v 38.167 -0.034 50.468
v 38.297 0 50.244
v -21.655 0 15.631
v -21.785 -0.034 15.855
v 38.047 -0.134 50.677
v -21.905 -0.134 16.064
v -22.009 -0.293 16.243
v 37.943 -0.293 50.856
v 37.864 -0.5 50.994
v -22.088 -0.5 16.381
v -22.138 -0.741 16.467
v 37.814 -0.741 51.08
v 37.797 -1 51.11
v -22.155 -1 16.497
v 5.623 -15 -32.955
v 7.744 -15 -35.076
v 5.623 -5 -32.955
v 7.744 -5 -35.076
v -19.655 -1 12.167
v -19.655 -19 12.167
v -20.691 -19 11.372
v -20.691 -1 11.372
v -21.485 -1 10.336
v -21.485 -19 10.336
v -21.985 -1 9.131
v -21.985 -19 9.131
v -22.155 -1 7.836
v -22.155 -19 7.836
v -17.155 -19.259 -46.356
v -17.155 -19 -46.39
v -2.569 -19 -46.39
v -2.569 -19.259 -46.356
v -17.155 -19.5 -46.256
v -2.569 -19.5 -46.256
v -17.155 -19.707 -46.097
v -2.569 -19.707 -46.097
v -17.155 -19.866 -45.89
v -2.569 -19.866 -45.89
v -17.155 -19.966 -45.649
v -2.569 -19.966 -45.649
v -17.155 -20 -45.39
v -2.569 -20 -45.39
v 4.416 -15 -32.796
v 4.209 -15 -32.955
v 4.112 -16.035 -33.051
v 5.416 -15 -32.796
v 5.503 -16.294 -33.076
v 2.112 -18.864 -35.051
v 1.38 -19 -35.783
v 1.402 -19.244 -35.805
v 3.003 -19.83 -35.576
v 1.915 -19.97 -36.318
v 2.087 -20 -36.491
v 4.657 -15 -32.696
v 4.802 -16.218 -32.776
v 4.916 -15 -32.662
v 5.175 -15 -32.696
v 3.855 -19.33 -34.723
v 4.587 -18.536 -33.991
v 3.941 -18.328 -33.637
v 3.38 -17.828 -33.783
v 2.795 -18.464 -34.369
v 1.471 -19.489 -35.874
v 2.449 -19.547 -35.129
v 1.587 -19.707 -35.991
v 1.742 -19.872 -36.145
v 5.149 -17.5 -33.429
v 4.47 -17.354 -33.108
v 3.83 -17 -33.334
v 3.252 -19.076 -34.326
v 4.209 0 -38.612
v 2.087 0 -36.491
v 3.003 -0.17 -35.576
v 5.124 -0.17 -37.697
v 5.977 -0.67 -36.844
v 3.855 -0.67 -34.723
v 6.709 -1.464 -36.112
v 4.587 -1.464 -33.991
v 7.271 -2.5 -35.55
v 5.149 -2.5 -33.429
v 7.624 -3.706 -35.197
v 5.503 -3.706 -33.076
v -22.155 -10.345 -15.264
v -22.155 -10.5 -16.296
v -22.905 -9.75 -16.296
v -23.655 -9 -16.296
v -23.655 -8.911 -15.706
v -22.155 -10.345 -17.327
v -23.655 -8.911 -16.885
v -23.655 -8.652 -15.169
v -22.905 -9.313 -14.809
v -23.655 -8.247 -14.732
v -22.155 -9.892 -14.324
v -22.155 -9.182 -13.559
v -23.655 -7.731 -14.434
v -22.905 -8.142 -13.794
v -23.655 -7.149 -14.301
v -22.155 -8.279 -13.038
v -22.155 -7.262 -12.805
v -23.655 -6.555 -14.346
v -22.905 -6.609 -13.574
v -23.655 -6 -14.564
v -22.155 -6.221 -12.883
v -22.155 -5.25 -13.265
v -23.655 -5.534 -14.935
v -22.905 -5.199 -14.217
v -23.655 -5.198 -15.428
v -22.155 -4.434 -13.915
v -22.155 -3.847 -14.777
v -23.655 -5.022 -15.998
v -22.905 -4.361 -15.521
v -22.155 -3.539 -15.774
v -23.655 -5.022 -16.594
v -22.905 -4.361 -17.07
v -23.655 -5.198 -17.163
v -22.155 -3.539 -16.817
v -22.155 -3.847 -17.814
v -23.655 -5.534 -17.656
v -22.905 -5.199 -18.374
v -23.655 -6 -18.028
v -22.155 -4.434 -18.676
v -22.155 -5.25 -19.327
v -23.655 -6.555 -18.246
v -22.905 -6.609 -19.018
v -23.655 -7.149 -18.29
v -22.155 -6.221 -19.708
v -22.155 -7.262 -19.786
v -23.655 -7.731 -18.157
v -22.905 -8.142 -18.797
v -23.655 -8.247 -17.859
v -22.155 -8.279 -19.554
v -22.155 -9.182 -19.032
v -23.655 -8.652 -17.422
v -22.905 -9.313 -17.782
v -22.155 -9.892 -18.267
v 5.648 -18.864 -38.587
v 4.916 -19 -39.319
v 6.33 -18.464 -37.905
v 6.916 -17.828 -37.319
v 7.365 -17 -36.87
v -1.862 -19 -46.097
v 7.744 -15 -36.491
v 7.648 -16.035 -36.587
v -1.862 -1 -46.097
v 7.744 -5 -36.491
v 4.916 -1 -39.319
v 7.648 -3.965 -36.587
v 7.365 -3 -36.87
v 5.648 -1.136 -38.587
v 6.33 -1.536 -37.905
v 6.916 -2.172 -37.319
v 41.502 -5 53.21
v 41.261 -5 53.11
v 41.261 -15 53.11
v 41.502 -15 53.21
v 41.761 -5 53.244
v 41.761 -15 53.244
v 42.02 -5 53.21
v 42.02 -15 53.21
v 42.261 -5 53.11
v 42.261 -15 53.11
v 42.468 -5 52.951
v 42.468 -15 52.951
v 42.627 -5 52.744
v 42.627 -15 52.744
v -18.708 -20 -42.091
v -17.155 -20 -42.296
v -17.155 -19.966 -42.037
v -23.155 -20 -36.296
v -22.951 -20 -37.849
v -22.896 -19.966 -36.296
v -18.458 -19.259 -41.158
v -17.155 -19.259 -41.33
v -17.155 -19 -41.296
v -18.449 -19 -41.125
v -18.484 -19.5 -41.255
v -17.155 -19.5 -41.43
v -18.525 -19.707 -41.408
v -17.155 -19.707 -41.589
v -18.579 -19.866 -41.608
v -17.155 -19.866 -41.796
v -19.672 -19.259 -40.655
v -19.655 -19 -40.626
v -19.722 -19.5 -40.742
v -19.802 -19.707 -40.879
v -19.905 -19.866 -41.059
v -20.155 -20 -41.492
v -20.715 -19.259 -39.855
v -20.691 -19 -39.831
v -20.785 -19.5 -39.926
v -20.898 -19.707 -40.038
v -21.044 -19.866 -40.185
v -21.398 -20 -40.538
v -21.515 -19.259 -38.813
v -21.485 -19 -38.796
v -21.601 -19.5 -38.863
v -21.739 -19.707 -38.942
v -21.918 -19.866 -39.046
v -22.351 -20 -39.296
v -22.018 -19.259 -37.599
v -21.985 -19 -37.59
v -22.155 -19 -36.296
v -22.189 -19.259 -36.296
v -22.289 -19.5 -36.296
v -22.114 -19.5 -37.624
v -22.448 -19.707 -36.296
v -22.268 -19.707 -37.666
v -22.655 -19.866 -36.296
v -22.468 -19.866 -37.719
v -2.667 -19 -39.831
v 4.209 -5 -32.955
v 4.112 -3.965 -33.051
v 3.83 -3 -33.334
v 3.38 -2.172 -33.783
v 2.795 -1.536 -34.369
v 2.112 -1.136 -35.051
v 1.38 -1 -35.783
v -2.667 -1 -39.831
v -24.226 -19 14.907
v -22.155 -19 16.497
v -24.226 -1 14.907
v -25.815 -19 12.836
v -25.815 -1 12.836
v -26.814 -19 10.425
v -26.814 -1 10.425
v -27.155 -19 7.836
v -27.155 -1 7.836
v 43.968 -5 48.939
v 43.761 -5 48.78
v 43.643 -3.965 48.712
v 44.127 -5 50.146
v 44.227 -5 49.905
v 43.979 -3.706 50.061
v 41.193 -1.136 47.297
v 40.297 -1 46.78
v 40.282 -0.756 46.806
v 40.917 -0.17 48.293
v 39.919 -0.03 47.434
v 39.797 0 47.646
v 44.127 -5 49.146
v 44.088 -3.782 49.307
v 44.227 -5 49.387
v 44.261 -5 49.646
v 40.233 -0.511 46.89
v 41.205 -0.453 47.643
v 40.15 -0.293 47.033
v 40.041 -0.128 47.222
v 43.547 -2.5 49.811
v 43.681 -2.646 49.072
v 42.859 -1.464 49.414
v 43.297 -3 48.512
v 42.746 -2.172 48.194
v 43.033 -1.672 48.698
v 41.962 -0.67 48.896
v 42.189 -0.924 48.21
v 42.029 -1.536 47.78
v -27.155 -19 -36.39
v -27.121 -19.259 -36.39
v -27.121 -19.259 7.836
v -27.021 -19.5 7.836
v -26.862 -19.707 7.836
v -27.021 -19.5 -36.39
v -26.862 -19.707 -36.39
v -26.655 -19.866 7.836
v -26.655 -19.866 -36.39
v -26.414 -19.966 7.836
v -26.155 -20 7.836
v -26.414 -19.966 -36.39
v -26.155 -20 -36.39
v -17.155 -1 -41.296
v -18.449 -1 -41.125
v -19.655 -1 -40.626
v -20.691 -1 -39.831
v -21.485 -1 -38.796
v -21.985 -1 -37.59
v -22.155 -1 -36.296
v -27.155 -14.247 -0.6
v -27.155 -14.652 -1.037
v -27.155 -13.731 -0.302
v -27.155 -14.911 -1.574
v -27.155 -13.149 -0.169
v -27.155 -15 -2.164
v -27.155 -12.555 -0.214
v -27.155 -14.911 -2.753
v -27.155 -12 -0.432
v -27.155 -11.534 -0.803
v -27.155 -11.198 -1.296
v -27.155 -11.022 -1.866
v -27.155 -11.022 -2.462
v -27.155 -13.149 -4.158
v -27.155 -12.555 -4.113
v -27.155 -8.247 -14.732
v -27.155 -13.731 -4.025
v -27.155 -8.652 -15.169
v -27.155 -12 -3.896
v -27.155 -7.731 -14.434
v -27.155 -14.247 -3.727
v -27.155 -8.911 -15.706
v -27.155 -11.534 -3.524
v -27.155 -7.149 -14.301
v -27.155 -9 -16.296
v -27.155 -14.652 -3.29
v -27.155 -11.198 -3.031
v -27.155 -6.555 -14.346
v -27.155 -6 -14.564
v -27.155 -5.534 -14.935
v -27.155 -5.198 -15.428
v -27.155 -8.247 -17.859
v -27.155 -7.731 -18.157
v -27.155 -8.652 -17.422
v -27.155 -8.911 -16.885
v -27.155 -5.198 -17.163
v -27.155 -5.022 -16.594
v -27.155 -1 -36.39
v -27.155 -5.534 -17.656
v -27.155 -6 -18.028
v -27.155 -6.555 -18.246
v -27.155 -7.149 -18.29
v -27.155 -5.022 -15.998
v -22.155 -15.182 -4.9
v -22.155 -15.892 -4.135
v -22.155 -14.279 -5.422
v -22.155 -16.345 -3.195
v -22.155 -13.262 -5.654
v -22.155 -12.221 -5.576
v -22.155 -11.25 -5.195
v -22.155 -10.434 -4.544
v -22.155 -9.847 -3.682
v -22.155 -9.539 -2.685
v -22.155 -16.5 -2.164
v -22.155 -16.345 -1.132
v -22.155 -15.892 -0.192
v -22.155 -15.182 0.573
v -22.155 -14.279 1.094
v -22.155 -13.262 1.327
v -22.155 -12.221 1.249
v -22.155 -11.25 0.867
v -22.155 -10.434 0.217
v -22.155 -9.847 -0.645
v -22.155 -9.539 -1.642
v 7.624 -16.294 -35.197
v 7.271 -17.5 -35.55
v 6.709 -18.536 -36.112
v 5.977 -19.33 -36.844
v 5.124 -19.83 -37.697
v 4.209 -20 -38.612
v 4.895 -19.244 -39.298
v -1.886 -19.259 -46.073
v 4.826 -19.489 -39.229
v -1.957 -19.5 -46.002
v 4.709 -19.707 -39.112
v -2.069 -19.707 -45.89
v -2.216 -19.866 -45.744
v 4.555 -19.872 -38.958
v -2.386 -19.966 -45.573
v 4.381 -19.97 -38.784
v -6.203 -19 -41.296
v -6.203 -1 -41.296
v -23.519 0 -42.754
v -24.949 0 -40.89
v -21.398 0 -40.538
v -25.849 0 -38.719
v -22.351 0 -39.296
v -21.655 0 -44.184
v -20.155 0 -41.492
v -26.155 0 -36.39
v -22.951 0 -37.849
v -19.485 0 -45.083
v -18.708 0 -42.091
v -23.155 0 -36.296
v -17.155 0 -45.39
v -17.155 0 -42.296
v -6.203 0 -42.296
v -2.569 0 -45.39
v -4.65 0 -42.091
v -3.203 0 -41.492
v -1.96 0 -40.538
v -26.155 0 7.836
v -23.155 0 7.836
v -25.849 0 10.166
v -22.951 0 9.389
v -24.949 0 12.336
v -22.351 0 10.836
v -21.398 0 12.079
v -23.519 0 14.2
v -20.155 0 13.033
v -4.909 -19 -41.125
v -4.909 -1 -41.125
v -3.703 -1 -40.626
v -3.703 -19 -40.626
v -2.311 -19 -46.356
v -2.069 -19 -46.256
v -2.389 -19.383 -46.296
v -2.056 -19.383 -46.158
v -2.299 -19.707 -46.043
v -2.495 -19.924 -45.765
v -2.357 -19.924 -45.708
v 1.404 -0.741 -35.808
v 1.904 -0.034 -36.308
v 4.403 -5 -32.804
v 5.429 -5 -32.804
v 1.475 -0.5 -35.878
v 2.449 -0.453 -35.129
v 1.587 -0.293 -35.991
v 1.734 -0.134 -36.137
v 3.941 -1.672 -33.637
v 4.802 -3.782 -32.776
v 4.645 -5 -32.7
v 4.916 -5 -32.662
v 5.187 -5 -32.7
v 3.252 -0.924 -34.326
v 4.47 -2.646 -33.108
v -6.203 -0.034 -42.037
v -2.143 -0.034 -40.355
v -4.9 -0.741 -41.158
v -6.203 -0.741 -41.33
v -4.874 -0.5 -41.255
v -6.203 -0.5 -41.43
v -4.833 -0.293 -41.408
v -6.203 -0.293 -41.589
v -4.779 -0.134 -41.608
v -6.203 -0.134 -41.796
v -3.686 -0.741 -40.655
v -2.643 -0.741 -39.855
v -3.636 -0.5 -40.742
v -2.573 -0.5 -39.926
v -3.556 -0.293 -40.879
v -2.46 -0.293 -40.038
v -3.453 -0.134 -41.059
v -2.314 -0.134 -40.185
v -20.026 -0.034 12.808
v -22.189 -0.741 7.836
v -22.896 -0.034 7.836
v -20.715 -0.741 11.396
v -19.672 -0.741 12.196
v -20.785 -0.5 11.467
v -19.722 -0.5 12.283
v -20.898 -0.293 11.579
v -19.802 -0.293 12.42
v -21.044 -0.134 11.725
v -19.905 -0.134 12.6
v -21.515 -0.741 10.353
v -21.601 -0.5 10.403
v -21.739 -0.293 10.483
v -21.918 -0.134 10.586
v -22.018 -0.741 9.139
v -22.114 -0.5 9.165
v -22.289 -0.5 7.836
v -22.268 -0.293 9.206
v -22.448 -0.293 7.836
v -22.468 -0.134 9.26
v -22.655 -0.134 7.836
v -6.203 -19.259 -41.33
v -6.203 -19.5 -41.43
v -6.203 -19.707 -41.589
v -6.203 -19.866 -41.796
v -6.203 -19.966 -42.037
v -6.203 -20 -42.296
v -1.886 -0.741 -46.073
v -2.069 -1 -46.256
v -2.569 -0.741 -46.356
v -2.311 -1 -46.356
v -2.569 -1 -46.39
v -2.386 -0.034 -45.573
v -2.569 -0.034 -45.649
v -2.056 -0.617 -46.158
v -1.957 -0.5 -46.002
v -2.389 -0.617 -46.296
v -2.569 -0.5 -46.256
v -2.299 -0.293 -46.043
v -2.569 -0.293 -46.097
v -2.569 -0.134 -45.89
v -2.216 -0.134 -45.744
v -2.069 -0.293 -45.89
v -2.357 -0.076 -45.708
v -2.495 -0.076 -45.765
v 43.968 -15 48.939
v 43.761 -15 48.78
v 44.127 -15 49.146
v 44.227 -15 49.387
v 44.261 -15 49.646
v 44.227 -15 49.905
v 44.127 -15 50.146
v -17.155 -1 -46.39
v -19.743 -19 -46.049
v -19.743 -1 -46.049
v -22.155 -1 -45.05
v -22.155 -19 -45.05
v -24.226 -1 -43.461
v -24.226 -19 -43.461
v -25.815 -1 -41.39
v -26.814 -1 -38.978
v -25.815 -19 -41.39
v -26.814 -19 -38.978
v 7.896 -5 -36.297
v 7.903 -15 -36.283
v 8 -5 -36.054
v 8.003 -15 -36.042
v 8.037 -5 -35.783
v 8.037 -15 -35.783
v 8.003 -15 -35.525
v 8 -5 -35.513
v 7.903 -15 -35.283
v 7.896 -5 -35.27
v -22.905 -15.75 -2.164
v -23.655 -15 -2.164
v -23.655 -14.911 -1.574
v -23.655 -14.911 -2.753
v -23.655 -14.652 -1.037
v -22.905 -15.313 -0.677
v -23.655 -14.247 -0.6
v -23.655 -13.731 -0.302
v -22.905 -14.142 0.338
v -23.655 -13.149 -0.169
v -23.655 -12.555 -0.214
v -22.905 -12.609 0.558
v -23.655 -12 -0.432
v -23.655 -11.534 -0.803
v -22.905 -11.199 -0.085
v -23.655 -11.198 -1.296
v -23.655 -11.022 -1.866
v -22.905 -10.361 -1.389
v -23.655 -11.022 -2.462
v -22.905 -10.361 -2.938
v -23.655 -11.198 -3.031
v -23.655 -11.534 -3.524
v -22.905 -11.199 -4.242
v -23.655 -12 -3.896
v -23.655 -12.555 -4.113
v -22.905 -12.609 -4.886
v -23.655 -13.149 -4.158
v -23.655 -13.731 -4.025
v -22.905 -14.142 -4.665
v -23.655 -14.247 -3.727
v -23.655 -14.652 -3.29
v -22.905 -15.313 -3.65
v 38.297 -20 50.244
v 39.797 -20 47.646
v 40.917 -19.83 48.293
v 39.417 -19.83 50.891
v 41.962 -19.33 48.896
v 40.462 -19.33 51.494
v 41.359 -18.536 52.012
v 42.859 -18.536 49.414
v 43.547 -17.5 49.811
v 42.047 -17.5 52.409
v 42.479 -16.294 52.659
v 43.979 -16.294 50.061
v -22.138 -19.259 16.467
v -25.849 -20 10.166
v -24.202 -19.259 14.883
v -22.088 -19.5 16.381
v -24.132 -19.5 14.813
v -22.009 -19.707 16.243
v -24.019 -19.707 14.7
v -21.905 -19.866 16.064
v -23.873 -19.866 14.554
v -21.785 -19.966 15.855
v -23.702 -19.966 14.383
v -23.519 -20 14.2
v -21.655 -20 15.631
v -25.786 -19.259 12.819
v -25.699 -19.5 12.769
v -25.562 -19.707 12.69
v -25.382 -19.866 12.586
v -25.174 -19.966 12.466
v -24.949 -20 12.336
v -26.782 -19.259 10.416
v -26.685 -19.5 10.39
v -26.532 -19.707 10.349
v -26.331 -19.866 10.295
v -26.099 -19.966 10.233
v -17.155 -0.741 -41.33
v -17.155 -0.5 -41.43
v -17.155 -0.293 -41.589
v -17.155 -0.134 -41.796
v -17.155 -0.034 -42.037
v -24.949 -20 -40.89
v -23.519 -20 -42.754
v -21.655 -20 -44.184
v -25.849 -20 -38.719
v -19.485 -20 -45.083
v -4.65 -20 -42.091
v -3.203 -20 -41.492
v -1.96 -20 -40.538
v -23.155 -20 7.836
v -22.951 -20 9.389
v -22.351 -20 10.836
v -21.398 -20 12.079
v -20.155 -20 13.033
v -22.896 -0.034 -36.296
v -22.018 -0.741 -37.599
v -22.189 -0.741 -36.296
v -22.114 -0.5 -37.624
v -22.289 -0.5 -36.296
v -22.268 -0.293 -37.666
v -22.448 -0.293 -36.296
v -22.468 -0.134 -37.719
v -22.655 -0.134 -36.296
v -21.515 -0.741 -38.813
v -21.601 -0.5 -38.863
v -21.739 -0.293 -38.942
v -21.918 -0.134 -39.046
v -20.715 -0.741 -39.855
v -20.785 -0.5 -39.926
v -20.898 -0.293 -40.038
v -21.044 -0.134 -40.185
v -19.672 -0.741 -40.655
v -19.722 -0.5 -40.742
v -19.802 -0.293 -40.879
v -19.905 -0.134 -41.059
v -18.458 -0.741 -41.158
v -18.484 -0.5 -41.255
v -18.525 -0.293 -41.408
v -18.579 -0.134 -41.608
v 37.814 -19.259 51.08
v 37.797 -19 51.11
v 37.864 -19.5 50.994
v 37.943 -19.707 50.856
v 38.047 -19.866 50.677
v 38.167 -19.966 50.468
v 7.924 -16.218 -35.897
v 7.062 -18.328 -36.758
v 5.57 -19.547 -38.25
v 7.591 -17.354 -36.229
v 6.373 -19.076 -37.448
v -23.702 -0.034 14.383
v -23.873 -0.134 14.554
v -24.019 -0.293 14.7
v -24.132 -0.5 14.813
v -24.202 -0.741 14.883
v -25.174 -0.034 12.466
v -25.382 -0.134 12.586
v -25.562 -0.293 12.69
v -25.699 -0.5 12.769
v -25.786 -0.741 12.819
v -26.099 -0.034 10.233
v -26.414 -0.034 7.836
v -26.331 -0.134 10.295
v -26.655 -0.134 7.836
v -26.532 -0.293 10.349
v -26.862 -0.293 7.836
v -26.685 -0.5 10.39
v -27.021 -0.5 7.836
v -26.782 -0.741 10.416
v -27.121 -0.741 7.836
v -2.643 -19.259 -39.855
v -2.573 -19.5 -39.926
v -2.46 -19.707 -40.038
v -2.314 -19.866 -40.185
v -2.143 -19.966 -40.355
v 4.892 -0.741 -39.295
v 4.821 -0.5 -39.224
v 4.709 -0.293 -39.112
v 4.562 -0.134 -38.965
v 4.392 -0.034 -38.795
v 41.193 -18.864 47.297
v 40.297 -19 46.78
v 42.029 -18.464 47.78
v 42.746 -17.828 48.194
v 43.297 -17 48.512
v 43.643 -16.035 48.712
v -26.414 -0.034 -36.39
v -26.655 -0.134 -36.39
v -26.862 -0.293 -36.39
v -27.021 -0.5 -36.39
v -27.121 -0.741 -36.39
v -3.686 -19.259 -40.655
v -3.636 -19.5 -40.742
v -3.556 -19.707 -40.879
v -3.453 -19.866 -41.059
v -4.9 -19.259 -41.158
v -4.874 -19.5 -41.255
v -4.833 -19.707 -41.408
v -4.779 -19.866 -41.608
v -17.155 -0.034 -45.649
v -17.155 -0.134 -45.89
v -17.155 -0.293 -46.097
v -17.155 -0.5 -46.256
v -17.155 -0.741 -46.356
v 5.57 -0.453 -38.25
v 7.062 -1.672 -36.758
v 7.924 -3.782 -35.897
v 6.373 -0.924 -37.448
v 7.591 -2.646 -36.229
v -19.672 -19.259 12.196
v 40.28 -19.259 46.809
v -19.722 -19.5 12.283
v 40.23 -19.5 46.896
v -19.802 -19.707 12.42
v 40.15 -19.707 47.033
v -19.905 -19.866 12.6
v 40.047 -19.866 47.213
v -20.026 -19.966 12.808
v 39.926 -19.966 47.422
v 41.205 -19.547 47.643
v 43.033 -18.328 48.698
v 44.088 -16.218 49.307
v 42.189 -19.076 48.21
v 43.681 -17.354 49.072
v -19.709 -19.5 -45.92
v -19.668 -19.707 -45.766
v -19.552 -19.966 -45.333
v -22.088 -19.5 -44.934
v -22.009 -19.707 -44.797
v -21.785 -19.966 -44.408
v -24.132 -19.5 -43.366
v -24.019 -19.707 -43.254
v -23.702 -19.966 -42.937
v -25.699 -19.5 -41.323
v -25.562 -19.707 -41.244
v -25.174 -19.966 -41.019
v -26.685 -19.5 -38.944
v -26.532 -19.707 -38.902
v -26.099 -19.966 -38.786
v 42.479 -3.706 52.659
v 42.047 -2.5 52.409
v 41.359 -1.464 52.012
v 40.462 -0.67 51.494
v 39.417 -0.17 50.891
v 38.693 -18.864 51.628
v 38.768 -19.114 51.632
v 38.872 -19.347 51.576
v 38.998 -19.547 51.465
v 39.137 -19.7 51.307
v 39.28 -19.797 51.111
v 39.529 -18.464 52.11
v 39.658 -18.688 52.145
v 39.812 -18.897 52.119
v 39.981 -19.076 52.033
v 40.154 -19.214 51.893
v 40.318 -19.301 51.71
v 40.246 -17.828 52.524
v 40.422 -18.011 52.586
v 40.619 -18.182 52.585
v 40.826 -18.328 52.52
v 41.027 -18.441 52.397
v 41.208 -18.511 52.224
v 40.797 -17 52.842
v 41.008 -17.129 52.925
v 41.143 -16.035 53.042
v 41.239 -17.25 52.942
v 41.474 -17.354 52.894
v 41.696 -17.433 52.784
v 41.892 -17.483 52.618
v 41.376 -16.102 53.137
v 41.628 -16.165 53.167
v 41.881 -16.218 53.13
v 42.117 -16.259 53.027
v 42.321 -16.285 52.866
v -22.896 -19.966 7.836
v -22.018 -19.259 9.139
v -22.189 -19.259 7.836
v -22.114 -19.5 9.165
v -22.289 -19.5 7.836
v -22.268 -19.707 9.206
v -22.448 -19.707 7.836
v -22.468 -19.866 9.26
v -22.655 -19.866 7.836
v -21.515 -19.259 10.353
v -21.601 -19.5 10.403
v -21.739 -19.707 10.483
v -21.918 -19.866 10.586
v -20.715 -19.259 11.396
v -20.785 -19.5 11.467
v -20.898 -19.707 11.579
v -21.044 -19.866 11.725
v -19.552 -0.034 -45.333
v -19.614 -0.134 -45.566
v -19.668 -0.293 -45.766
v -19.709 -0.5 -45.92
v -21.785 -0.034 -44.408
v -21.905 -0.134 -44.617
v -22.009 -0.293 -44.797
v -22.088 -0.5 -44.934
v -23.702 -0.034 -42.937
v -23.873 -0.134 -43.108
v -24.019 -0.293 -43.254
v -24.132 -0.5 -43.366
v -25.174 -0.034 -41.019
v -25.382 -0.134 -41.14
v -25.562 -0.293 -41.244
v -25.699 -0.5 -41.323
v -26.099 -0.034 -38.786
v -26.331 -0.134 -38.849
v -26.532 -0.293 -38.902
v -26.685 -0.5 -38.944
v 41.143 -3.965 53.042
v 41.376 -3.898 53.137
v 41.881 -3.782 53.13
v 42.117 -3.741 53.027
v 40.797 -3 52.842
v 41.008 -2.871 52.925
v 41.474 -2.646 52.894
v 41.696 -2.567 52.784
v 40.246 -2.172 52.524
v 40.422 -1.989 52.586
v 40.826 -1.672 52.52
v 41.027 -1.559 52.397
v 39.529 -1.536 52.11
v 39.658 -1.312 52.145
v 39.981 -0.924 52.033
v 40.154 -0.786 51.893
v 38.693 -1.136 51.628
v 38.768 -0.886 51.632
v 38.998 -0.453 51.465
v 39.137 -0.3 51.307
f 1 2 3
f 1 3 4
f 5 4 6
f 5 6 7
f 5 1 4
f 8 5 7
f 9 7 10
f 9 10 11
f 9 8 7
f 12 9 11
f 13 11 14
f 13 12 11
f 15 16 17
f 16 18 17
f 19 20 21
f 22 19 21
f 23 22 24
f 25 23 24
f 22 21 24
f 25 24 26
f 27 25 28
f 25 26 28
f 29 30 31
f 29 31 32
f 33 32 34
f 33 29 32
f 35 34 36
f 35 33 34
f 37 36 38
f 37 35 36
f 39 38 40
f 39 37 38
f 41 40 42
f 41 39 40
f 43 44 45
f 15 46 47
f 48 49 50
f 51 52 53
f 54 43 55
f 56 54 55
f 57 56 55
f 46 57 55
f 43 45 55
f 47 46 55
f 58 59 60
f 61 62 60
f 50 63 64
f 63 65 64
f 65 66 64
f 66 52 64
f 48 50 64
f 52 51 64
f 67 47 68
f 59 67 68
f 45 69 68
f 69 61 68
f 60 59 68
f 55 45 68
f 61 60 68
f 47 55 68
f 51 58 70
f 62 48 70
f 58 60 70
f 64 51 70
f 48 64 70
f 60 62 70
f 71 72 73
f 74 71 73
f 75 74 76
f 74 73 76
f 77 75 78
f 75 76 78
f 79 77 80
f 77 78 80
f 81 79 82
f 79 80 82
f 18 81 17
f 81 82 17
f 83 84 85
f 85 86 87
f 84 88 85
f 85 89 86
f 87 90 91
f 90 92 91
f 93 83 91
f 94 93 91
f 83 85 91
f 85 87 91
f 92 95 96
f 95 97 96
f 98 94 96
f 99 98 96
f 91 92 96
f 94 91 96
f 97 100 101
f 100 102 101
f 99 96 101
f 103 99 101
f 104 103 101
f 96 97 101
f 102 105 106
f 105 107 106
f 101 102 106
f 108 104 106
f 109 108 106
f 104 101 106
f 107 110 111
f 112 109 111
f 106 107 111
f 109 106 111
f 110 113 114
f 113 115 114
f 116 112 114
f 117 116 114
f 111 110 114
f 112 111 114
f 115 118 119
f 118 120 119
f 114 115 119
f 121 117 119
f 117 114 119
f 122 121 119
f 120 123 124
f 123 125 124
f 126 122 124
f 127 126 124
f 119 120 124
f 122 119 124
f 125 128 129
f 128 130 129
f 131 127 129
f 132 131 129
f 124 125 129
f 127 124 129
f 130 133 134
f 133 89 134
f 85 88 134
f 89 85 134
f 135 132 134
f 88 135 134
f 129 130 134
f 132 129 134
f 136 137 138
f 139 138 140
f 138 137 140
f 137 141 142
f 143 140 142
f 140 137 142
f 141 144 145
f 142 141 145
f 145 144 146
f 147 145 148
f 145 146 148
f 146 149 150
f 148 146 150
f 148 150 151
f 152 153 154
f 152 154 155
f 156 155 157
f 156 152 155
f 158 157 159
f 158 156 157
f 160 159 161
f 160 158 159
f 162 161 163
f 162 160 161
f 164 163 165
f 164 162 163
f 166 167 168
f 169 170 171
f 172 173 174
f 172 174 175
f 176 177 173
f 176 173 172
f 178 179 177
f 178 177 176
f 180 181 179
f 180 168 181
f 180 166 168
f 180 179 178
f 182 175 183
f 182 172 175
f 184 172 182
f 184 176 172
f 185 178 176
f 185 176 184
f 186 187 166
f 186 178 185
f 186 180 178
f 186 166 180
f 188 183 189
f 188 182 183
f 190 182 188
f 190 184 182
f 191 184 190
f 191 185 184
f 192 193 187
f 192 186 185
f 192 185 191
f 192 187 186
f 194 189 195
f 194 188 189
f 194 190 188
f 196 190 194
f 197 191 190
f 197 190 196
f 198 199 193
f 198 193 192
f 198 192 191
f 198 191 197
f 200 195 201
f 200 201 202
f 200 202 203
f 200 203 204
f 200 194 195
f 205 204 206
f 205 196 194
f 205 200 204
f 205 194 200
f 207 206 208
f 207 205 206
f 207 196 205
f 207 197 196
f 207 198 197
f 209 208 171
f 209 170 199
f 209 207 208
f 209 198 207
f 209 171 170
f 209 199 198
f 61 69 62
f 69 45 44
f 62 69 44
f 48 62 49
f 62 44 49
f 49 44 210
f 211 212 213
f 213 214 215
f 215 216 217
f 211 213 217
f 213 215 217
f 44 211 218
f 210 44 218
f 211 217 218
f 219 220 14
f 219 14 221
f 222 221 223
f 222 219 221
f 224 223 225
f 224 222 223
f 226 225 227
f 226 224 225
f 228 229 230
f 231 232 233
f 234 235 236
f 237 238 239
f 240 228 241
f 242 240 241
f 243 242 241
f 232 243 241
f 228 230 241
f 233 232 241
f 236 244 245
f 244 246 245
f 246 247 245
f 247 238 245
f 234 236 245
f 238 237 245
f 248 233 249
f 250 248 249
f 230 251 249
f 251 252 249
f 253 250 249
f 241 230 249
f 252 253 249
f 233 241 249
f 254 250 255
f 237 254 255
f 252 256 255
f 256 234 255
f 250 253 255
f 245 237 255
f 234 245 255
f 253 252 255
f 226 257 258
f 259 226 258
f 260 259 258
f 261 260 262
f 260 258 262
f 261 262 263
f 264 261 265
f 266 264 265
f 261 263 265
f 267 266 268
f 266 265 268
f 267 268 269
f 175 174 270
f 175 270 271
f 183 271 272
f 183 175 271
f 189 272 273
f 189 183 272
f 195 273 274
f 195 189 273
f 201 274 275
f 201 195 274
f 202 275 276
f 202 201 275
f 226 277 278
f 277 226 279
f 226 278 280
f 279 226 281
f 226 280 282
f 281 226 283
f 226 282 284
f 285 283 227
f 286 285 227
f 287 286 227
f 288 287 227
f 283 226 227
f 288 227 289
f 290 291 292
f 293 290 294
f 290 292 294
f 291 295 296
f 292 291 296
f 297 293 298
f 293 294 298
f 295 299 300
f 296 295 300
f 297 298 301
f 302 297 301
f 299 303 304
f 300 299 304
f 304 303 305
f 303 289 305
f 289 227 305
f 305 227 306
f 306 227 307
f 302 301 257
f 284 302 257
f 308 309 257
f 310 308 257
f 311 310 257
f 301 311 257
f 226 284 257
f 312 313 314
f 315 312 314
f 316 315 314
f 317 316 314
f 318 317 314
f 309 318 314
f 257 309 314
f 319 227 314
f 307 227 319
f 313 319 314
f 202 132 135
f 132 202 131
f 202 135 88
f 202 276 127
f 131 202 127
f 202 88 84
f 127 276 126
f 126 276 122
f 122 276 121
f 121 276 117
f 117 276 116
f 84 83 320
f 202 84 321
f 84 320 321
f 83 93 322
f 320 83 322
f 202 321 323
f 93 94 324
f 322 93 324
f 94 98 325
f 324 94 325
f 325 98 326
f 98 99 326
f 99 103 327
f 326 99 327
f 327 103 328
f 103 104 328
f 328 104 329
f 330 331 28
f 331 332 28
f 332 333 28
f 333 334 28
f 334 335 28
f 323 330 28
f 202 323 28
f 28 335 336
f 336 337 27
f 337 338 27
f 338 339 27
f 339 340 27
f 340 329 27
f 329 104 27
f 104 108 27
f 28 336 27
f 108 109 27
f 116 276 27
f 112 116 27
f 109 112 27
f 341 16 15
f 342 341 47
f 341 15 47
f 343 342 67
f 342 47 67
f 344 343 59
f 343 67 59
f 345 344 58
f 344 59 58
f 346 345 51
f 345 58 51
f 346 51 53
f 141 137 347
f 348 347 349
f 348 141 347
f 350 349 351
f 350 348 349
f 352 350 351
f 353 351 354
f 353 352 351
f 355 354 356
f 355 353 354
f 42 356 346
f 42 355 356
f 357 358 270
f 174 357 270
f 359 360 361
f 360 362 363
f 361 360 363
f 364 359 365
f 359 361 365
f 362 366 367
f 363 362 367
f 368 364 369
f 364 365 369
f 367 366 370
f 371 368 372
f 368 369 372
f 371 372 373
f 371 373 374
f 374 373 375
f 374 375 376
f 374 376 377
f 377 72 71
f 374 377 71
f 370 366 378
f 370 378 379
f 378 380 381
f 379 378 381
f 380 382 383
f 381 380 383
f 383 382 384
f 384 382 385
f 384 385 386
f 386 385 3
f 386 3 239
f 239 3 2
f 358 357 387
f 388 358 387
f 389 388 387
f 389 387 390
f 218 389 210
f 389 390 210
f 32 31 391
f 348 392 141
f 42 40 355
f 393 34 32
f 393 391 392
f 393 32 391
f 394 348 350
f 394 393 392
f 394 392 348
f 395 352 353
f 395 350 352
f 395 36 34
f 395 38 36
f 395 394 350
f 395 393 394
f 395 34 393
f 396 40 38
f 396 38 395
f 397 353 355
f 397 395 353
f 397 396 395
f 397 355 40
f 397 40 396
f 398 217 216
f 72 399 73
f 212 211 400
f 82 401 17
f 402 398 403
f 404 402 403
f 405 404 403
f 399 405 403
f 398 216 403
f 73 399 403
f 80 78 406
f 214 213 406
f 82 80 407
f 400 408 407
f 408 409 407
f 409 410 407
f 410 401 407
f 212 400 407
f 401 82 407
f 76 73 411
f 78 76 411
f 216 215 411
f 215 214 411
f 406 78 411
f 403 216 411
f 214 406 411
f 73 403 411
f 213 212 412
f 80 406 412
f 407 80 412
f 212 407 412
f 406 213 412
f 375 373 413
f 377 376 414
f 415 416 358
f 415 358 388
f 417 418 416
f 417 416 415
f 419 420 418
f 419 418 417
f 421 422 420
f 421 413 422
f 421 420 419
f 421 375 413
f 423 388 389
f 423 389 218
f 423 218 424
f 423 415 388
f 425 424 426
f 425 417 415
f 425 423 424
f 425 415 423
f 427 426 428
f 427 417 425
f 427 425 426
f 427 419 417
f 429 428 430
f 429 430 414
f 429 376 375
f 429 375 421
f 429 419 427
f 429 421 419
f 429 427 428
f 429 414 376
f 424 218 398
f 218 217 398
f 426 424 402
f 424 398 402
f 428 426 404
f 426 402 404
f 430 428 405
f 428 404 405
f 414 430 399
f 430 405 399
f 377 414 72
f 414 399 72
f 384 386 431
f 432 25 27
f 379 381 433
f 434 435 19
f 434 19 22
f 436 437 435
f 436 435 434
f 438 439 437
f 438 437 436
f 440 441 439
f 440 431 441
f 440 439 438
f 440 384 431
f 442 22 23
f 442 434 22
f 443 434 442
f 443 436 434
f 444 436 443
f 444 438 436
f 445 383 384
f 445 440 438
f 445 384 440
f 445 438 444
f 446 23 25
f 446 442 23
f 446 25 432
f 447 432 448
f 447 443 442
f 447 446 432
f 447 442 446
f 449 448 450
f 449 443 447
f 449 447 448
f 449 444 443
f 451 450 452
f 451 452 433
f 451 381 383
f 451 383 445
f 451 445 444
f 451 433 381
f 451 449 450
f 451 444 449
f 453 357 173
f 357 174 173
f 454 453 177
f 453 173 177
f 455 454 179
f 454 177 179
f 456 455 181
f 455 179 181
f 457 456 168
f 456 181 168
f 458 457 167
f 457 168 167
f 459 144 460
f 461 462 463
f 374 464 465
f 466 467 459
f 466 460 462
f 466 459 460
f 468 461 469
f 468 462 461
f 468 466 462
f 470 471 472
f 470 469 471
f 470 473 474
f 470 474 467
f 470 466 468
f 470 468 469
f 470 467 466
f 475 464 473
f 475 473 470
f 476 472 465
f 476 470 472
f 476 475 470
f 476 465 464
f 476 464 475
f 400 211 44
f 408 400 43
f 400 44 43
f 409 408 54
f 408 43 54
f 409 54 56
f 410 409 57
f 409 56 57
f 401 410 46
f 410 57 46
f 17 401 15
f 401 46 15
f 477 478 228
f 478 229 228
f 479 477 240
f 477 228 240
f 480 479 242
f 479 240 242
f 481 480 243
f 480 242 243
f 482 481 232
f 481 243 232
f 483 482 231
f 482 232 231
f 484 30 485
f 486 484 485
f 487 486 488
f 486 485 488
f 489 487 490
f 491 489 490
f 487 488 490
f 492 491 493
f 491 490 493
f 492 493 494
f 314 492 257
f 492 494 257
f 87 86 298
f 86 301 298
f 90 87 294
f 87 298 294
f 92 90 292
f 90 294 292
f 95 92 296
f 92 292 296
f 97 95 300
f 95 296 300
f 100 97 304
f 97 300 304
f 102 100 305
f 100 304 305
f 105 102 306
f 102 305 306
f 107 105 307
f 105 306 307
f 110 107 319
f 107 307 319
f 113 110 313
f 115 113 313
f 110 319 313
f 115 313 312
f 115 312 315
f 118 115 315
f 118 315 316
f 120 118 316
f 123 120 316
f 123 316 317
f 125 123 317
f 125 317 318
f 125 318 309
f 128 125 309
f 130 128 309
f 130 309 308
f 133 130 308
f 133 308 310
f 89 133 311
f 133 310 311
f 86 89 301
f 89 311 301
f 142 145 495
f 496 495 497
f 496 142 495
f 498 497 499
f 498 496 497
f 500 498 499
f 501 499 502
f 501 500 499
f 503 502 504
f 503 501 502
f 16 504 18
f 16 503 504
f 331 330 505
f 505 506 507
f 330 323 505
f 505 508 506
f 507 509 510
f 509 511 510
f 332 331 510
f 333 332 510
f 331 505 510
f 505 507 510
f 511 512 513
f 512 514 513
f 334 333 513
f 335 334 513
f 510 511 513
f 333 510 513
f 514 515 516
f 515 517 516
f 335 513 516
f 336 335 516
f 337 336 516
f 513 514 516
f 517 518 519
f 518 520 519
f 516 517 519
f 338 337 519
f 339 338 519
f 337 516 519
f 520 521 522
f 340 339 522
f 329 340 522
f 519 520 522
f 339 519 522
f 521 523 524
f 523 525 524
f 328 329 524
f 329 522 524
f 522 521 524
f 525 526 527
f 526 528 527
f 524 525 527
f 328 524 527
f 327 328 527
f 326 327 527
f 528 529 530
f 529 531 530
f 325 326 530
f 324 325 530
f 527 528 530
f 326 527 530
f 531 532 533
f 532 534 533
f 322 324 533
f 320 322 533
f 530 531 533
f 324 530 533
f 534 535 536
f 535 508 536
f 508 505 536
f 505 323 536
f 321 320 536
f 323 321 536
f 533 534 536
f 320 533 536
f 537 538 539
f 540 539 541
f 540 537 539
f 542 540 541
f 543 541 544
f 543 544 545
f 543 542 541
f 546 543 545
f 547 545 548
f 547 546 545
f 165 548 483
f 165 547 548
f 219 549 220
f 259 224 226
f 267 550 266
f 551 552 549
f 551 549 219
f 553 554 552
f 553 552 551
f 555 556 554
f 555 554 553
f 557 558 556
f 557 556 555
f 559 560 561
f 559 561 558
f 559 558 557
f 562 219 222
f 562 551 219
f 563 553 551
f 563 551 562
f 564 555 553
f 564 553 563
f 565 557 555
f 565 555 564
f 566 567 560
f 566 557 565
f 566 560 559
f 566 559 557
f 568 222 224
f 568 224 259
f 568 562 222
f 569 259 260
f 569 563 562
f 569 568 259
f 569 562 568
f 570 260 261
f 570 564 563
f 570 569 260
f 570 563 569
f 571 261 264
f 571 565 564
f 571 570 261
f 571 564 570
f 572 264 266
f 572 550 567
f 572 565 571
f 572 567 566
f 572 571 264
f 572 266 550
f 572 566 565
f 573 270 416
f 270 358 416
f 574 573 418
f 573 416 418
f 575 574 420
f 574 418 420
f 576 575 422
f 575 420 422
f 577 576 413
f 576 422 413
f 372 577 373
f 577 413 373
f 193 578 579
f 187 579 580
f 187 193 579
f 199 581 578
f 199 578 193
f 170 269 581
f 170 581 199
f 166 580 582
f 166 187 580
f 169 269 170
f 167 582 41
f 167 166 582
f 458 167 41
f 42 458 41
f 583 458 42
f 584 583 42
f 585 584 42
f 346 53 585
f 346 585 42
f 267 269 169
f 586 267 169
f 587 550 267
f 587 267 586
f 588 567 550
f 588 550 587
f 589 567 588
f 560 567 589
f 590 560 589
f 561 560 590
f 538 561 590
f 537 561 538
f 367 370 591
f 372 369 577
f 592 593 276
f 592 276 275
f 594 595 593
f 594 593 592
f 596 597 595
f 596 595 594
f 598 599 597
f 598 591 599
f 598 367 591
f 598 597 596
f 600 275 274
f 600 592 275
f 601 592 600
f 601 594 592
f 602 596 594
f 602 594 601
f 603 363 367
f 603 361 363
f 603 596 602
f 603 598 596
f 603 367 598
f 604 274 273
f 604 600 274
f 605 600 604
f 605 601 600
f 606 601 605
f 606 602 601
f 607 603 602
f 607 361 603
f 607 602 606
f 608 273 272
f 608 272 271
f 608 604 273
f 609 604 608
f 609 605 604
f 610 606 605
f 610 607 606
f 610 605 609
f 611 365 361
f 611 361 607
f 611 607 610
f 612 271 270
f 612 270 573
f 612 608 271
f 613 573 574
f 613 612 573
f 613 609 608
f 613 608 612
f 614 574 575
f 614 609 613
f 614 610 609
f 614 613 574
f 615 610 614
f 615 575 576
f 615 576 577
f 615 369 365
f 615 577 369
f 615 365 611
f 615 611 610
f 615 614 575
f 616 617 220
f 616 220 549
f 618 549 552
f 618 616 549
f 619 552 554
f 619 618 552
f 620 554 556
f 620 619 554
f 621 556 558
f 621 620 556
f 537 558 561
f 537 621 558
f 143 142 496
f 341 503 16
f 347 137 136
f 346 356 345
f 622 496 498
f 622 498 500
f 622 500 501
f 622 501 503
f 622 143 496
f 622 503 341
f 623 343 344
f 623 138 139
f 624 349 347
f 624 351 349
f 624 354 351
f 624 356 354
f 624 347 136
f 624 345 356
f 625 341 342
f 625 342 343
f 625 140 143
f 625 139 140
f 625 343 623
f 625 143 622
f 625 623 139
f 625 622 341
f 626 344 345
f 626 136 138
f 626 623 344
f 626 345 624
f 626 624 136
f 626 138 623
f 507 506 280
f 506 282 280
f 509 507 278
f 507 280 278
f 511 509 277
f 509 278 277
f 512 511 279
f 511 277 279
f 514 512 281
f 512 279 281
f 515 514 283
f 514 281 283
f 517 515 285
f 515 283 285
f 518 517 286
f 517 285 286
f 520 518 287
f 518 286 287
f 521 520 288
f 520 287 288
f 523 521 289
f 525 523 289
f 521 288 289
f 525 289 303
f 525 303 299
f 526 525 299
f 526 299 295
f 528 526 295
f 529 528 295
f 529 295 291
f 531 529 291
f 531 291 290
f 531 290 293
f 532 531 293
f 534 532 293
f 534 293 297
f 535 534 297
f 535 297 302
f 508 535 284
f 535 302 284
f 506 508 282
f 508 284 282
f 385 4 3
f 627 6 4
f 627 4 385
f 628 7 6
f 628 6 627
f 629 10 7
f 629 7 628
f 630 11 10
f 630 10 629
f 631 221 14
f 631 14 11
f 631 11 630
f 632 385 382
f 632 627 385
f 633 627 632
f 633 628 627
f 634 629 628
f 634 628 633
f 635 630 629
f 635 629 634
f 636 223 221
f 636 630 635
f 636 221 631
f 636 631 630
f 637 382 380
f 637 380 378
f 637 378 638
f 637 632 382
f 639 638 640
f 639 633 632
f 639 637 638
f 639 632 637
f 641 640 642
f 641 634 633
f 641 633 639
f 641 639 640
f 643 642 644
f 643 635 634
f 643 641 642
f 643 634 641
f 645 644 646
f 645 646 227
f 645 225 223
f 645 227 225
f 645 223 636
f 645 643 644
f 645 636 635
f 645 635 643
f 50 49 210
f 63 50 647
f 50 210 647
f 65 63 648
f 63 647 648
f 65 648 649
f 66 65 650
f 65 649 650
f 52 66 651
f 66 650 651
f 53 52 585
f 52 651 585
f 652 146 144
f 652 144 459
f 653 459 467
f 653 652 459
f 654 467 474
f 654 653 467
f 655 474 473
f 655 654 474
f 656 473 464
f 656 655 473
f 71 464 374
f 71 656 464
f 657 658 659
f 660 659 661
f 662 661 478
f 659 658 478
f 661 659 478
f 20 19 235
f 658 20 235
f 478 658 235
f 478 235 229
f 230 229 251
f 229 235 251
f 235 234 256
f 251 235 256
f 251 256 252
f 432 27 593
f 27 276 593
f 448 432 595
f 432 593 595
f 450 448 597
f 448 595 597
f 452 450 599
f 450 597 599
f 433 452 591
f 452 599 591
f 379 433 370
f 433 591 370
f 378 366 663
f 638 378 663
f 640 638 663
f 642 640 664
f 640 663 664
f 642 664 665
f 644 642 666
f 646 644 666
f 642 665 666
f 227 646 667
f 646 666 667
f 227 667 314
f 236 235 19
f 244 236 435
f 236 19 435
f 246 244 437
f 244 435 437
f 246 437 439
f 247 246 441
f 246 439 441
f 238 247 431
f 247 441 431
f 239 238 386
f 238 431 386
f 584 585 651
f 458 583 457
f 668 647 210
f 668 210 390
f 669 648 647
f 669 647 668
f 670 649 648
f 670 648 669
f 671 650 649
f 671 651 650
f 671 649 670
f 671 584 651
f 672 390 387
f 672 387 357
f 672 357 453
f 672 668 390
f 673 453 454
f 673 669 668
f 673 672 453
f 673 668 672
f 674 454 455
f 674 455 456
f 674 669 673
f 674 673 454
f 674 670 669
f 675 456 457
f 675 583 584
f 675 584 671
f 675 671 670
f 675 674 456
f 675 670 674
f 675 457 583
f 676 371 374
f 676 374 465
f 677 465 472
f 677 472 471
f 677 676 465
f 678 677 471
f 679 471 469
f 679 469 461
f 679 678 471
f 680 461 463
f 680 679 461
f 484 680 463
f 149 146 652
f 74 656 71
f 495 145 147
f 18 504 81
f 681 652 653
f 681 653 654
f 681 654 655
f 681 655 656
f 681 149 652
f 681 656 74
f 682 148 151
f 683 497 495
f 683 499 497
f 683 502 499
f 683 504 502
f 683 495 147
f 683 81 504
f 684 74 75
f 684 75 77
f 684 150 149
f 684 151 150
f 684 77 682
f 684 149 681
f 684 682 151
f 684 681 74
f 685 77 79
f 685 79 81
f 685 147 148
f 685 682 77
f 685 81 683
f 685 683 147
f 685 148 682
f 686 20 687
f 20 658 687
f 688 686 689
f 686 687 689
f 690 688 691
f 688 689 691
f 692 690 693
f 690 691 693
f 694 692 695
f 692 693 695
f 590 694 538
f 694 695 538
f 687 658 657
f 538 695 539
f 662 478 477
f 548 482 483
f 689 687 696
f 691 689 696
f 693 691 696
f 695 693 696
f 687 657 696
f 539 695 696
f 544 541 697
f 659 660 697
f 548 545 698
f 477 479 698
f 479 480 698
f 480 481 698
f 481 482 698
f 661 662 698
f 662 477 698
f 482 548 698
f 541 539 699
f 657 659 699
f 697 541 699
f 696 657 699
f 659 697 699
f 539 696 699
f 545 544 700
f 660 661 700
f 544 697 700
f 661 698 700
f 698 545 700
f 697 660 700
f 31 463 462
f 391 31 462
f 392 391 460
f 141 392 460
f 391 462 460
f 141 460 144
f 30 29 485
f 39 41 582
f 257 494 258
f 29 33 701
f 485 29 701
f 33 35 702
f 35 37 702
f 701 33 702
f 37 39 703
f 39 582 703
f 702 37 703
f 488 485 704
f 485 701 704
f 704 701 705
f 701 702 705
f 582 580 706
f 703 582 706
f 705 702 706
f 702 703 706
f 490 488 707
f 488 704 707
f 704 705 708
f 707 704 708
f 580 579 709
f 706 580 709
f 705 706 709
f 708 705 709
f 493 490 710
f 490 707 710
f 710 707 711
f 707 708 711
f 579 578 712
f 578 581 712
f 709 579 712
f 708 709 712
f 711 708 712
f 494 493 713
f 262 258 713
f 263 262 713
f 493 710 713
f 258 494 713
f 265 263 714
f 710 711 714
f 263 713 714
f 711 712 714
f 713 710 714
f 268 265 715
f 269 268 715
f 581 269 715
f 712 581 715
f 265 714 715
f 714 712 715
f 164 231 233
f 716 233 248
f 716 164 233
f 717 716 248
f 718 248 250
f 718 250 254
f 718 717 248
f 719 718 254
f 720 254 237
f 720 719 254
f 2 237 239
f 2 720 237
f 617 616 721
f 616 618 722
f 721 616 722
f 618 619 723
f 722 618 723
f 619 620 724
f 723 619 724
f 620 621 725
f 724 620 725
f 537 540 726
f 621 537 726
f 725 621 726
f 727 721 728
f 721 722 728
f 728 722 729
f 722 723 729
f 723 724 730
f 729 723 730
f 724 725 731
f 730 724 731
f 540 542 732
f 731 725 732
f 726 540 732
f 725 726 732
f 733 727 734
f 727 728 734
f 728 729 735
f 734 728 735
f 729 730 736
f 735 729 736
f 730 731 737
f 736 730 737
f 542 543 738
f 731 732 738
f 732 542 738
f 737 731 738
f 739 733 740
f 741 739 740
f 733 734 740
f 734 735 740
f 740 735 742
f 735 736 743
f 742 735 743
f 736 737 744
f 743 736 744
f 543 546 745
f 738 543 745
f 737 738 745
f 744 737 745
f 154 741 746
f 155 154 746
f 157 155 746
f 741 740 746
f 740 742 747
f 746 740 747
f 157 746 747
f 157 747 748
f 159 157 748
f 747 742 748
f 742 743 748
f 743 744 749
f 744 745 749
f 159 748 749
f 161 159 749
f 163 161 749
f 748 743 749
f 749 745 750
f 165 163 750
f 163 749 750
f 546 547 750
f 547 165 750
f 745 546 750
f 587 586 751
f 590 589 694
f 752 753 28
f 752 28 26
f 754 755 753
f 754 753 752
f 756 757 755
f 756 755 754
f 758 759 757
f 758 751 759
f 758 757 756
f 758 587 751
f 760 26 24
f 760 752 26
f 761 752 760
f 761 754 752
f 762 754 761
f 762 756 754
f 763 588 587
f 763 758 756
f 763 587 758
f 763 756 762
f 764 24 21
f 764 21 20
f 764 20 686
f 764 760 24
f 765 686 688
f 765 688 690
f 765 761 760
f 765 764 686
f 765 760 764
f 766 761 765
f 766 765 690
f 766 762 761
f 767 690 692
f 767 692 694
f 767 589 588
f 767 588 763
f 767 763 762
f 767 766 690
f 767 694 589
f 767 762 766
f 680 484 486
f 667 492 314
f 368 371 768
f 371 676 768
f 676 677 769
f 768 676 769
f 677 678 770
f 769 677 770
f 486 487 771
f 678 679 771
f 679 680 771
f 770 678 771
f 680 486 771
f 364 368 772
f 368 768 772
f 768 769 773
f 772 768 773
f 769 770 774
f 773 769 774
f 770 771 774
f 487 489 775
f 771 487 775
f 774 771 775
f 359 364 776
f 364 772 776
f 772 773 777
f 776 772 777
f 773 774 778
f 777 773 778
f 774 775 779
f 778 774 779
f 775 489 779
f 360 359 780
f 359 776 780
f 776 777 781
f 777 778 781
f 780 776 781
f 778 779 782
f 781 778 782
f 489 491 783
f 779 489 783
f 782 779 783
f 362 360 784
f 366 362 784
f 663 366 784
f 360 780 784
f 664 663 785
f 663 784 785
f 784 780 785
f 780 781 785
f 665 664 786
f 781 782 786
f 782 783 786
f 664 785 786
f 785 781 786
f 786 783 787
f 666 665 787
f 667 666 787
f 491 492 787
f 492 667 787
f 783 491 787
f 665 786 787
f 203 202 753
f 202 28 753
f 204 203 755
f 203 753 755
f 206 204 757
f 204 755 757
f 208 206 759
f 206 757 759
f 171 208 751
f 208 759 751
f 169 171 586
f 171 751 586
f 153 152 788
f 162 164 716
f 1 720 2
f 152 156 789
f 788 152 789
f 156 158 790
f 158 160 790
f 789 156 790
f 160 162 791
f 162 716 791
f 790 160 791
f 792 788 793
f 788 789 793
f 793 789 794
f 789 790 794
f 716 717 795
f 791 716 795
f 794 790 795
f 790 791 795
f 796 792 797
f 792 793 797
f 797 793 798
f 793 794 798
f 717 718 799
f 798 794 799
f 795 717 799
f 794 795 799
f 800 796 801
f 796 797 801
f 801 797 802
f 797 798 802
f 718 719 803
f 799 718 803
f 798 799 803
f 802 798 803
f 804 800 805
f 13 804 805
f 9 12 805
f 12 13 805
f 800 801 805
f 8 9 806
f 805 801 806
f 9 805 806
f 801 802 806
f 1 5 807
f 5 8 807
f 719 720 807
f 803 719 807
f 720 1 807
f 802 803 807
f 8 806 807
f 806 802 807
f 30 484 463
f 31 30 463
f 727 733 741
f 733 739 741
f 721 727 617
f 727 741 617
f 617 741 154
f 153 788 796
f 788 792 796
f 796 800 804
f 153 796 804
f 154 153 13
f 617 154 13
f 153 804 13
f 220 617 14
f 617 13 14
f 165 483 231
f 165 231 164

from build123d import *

# Parameters (mm, degrees)
F1_DEPTH        = 20
F2_R            = 5
F3_R            = 5
F4_R            = 10
F5_R            = 5
F6_R            = 5
F7_R            = 5
F8_R            = 5
F9_R            = 5
F10_R           = 1
F11_R           = 1
F12_T1_DEPTH    = 14.5857864376
F12_T3_DEPTH    = 44.2264973081
F12_T5_DEPTH    = 69.2264973081
F12_T7_DEPTH    = 18
F12_T9_DEPTH    = 10
F12_T14_DEPTH   = 1
F12_T20_DEPTH   = 1
F12_T24_ANGLE   = 90
F12_T26_ANGLE   = 90
F12_T28_ANGLE   = 60
F12_T30_ANGLE   = 60
F12_T32_ANGLE   = 90
F12_T34_ANGLE   = 90
F14_D           = 4
F14_CSINK_D     = 7
F14_CSINK_ANGLE = 90
F15_D           = 4
F15_CSINK_D     = 7
F15_CSINK_ANGLE = 90


# Not quite as in the source:
# - a fillet or chamfer that OpenCascade refuses, or shapes differently, is made with other operations: its cross-section is extruded or revolved along the edge and cut away or added


with BuildPart() as f1:
    # F0 (on Front) → F1 (new body)
    with BuildSketch(Plane.XZ):
        Polygon((42.1268583603, 53.609912917), (-27.1551739424, 13.609912917), (-27.1551739424, -46.390087083), (-2.1551739424, -46.390087083), (8.4514277754, -35.7834853652), (4.9158938694, -32.2479514593), (-4.1318040205, -41.2956493492), (-22.1551739424, -41.2956493492), (-22.1551739424, 10.7231615711), (44.6268583603, 49.2797858981), align=None)
    extrude(amount=F1_DEPTH)

    # F2
    f2_edges = [f1.edges().sort_by_distance(p)[0] for p in [
        (-22.155174, -10, -41.295649),
    ]]
    fillet(f2_edges, radius=F2_R)

    # F3
    f3_edges = [f1.edges().sort_by_distance(p)[0] for p in [
        (-4.131804, -10, -41.295649),
    ]]
    fillet(f3_edges, radius=F3_R)

    # F4
    f4_edges = [f1.edges().sort_by_distance(p)[0] for p in [
        (-27.155174, -10, -46.390087),
        (-27.155174, -10, 13.609913),
    ]]
    fillet(f4_edges, radius=F4_R)

    # F5
    f5_edges = [f1.edges().sort_by_distance(p)[0] for p in [
        (-22.155174, -10, 10.723162),
    ]]
    fillet(f5_edges, radius=F5_R)

    # F6
    f6_edges = [f1.edges().sort_by_distance(p)[0] for p in [
        (6.683661, 0, -34.015718),
    ]]
    fillet(f6_edges, radius=F6_R)

    # F7
    f7_edges = [f1.edges().sort_by_distance(p)[0] for p in [
        (6.683661, -20, -34.015718),
    ]]
    fillet(f7_edges, radius=F7_R)

    # F8
    f8_edges = [f1.edges().sort_by_distance(p)[0] for p in [
        (43.376858, -20, 51.444849),
    ]]
    fillet(f8_edges, radius=F8_R)

    # F9
    f9_edges = [f1.edges().sort_by_distance(p)[0] for p in [
        (43.376858, 0, 51.444849),
    ]]
    fillet(f9_edges, radius=F9_R)

    # F10
    f10_edges = [f1.edges().sort_by_distance(p)[0] for p in [
        (43.358594, -18.535534, 48.547553),
    ]]
    fillet(f10_edges, radius=F10_R)

    # F11
    f11_edges = [f1.edges().sort_by_distance(p)[0] for p in [
        (7.415894, -18.535534, -36.819019),
    ]]
    fillet(f11_edges, radius=F11_R)

    # F12: fillet of radius 1 on 14 edges, made by hand

    # F12_s2 → F12_t1 (cut)
    with BuildSketch(Plane.YZ.offset(-17.1551739424)):
        with BuildLine():
            ThreePointArc((0, -45.390087083), (-0.2928932188, -46.0971938642), (-1, -46.390087083))
            Line((-1, -46.390087083), (0, -46.390087083))
            Line((0, -46.390087083), (0, -45.390087083))
        make_face()
        with BuildLine():
            ThreePointArc((-19, -46.390087083), (-19.7071067812, -46.0971938642), (-20, -45.390087083))
            Line((-20, -45.390087083), (-20, -46.390087083))
            Line((-20, -46.390087083), (-19, -46.390087083))
        make_face()
    extrude(amount=F12_T1_DEPTH, mode=Mode.SUBTRACT)

    # F12_s4 → F12_t3 (cut)
    with BuildSketch(Plane.XY.offset(-36.390087083)):
        with BuildLine():
            ThreePointArc((-26.1551739424, 0), (-26.8622807236, -0.2928932188), (-27.1551739424, -1))
            Line((-27.1551739424, -1), (-27.1551739424, 0))
            Line((-27.1551739424, 0), (-26.1551739424, 0))
        make_face()
        with BuildLine():
            ThreePointArc((-27.1551739424, -19), (-26.8622807236, -19.7071067812), (-26.1551739424, -20))
            Line((-26.1551739424, -20), (-27.1551739424, -20))
            Line((-27.1551739424, -20), (-27.1551739424, -19))
        make_face()
    extrude(amount=F12_T3_DEPTH, mode=Mode.SUBTRACT)

    # F12_s6 → F12_t5 (cut)
    with BuildSketch(Plane(origin=(50.4787899917, 0, 29.1439429901), x_dir=(0, 1, 0), z_dir=(-0.8660254038, 0, -0.5))):
        with BuildLine():
            ThreePointArc((0, -24.3641173007), (-0.2928932188, -25.0712240818), (-1, -25.3641173007))
            Line((-1, -25.3641173007), (0, -25.3641173007))
            Line((0, -25.3641173007), (0, -24.3641173007))
        make_face()
        with BuildLine():
            ThreePointArc((-19, -25.3641173007), (-19.7071067812, -25.0712240818), (-20, -24.3641173007))
            Line((-20, -24.3641173007), (-20, -25.3641173007))
            Line((-20, -25.3641173007), (-19, -25.3641173007))
        make_face()
    extrude(amount=F12_T5_DEPTH, mode=Mode.SUBTRACT)

    # F12_s8 → F12_t7 (cut)
    with BuildSketch(Plane.XZ.offset(1)):
        with BuildLine():
            ThreePointArc((-2.5693875048, -46.390087083), (-2.1867040725, -46.3139666155), (-1.8622807236, -46.0971938642))
            Line((-1.8622807236, -46.0971938642), (-2.1551739424, -46.390087083))
            Line((-2.1551739424, -46.390087083), (-2.5693875048, -46.390087083))
        make_face()
    extrude(amount=F12_T7_DEPTH, mode=Mode.SUBTRACT)

    # F12_s10 → F12_t9 (cut)
    with BuildSketch(Plane.XZ.offset(5)):
        with BuildLine():
            ThreePointArc((41.2608329565, 53.109912917), (42.0196520016, 53.2098133395), (42.6268583603, 52.7438875132))
            Line((42.6268583603, 52.7438875132), (42.1268583603, 53.609912917))
            Line((42.1268583603, 53.609912917), (41.2608329565, 53.109912917))
        make_face()
    extrude(amount=F12_T9_DEPTH, mode=Mode.SUBTRACT)


with BuildPart() as f12_tool12:
    # F12_s13 → F12_t14 (new body)
    with BuildSketch(Plane.XZ.offset(19)):
        Polygon((-2.5693875048, -45.390087083), (-1.8622807236, -46.0971938642), (-2.1551739424, -46.390087083), (-2.5693875048, -46.390087083), align=None)
    extrude(amount=F12_T14_DEPTH)

    # F12_s15 → F12_t16 (revolve, cut)
    with BuildSketch(Plane(origin=(-2.5693875048, -19, -45.390087083), x_dir=(-0.3826834324, 0, 0.9238795325), z_dir=(0.9238795325, 0, 0.3826834324))):
        with BuildLine():
            ThreePointArc((0, -1), (1, 0), (0, 1))
            Line((0, 1), (0, -1))
        make_face()
    revolve(axis=Axis((-2.5693875048, -19, -45.390087083), (0, -1, 0)), mode=Mode.SUBTRACT)


with BuildPart() as f1_1:
    add(f1.part)

    # F12_t11: cut F12_tool12
    add(f12_tool12.part, mode=Mode.SUBTRACT)


with BuildPart() as f12_tool18:
    # F12_s19 → F12_t20 (new body)
    with BuildSketch(Plane.XZ.offset(1)):
        Polygon((-2.5693875048, -45.390087083), (-1.8622807236, -46.0971938642), (-2.1551739424, -46.390087083), (-2.5693875048, -46.390087083), align=None)
    extrude(amount=-F12_T20_DEPTH)

    # F12_s21 → F12_t22 (revolve, cut)
    with BuildSketch(Plane(origin=(-2.5693875048, -1, -45.390087083), x_dir=(-0.3826834324, 0, 0.9238795325), z_dir=(-0.9238795325, 0, -0.3826834324))):
        with BuildLine():
            ThreePointArc((0, -1), (1, 0), (0, 1))
            Line((0, 1), (0, -1))
        make_face()
    revolve(axis=Axis((-2.5693875048, -1, -45.390087083), (0, 1, 0)), mode=Mode.SUBTRACT)


with BuildPart() as f1_2:
    add(f1_1.part)

    # F12_t17: cut F12_tool18
    add(f12_tool18.part, mode=Mode.SUBTRACT)

    # F12_s23 → F12_t24 (revolve, cut)
    with BuildSketch(Plane.YZ.offset(-17.1551739424)):
        with BuildLine():
            ThreePointArc((-19, -46.390087083), (-19.7071067812, -46.0971938642), (-20, -45.390087083))
            Line((-20, -45.390087083), (-20, -46.390087083))
            Line((-20, -46.390087083), (-19, -46.390087083))
        make_face()
    revolve(axis=Axis((-17.1551739424, -20, -36.390087083), (0, 1, 0)), revolution_arc=F12_T24_ANGLE, mode=Mode.SUBTRACT)

    # F12_s25 → F12_t26 (revolve, cut)
    with BuildSketch(Plane.YZ.offset(-17.1551739424)):
        with BuildLine():
            ThreePointArc((0, -45.390087083), (-0.2928932188, -46.0971938642), (-1, -46.390087083))
            Line((-1, -46.390087083), (0, -46.390087083))
            Line((0, -46.390087083), (0, -45.390087083))
        make_face()
    revolve(axis=Axis((-17.1551739424, 0, -36.390087083), (0, 1, 0)), revolution_arc=F12_T26_ANGLE, mode=Mode.SUBTRACT)

    # F12_s27 → F12_t28 (revolve, cut)
    with BuildSketch(Plane(origin=(-9.4731152921, 0, -5.469305664), x_dir=(0, 1, 0), z_dir=(0.8660254038, 0, 0.5))):
        with BuildLine():
            ThreePointArc((0, 24.3641173007), (-0.2928932188, 25.0712240818), (-1, 25.3641173007))
            Line((-1, 25.3641173007), (0, 25.3641173007))
            Line((0, 25.3641173007), (0, 24.3641173007))
        make_face()
    revolve(axis=Axis((-17.1551739424, 0, 7.8364102251), (0, -1, 0)), revolution_arc=F12_T28_ANGLE, mode=Mode.SUBTRACT)

    # F12_s29 → F12_t30 (revolve, cut)
    with BuildSketch(Plane(origin=(-9.4731152921, 0, -5.469305664), x_dir=(0, 1, 0), z_dir=(0.8660254038, 0, 0.5))):
        with BuildLine():
            ThreePointArc((-19, 25.3641173007), (-19.7071067812, 25.0712240818), (-20, 24.3641173007))
            Line((-20, 24.3641173007), (-20, 25.3641173007))
            Line((-20, 25.3641173007), (-19, 25.3641173007))
        make_face()
    revolve(axis=Axis((-17.1551739424, -20, 7.8364102251), (0, -1, 0)), revolution_arc=F12_T30_ANGLE, mode=Mode.SUBTRACT)

    # F12_s31 → F12_t32 (revolve, cut)
    with BuildSketch(Plane.XZ.offset(5)):
        with BuildLine():
            ThreePointArc((41.2608329565, 53.109912917), (42.0196520016, 53.2098133395), (42.6268583603, 52.7438875132))
            Line((42.6268583603, 52.7438875132), (42.1268583603, 53.609912917))
            Line((42.1268583603, 53.609912917), (41.2608329565, 53.109912917))
        make_face()
    revolve(axis=Axis((37.7967313414, -5, 51.109912917), (-0.5, 0, 0.8660254038)), revolution_arc=F12_T32_ANGLE, mode=Mode.SUBTRACT)

    # F12_s33 → F12_t34 (revolve, cut)
    with BuildSketch(Plane(origin=(50.4787899917, 0, 29.1439429901), x_dir=(0, 1, 0), z_dir=(-0.8660254038, 0, -0.5))):
        with BuildLine():
            ThreePointArc((-19, -25.3641173007), (-19.7071067812, -25.0712240818), (-20, -24.3641173007))
            Line((-20, -24.3641173007), (-20, -25.3641173007))
            Line((-20, -25.3641173007), (-19, -25.3641173007))
        make_face()
    revolve(axis=Axis((37.7967313414, -15, 51.109912917), (-0.5, 0, 0.8660254038)), revolution_arc=F12_T34_ANGLE, mode=Mode.SUBTRACT)

    # F14 (through all)
    with Locations(Plane.YZ.offset(-22.1551739424)):
        with Locations((-13, -2.1635897749)):
            CounterSinkHole(F14_D / 2, F14_CSINK_D / 2, counter_sink_angle=F14_CSINK_ANGLE)

    # F15 (through all)
    with Locations(Plane.YZ.offset(-22.1551739424)):
        with Locations((-7, -16.2956493492)):
            CounterSinkHole(F15_D / 2, F15_CSINK_D / 2, counter_sink_angle=F15_CSINK_ANGLE)


solid = f1_2.part
